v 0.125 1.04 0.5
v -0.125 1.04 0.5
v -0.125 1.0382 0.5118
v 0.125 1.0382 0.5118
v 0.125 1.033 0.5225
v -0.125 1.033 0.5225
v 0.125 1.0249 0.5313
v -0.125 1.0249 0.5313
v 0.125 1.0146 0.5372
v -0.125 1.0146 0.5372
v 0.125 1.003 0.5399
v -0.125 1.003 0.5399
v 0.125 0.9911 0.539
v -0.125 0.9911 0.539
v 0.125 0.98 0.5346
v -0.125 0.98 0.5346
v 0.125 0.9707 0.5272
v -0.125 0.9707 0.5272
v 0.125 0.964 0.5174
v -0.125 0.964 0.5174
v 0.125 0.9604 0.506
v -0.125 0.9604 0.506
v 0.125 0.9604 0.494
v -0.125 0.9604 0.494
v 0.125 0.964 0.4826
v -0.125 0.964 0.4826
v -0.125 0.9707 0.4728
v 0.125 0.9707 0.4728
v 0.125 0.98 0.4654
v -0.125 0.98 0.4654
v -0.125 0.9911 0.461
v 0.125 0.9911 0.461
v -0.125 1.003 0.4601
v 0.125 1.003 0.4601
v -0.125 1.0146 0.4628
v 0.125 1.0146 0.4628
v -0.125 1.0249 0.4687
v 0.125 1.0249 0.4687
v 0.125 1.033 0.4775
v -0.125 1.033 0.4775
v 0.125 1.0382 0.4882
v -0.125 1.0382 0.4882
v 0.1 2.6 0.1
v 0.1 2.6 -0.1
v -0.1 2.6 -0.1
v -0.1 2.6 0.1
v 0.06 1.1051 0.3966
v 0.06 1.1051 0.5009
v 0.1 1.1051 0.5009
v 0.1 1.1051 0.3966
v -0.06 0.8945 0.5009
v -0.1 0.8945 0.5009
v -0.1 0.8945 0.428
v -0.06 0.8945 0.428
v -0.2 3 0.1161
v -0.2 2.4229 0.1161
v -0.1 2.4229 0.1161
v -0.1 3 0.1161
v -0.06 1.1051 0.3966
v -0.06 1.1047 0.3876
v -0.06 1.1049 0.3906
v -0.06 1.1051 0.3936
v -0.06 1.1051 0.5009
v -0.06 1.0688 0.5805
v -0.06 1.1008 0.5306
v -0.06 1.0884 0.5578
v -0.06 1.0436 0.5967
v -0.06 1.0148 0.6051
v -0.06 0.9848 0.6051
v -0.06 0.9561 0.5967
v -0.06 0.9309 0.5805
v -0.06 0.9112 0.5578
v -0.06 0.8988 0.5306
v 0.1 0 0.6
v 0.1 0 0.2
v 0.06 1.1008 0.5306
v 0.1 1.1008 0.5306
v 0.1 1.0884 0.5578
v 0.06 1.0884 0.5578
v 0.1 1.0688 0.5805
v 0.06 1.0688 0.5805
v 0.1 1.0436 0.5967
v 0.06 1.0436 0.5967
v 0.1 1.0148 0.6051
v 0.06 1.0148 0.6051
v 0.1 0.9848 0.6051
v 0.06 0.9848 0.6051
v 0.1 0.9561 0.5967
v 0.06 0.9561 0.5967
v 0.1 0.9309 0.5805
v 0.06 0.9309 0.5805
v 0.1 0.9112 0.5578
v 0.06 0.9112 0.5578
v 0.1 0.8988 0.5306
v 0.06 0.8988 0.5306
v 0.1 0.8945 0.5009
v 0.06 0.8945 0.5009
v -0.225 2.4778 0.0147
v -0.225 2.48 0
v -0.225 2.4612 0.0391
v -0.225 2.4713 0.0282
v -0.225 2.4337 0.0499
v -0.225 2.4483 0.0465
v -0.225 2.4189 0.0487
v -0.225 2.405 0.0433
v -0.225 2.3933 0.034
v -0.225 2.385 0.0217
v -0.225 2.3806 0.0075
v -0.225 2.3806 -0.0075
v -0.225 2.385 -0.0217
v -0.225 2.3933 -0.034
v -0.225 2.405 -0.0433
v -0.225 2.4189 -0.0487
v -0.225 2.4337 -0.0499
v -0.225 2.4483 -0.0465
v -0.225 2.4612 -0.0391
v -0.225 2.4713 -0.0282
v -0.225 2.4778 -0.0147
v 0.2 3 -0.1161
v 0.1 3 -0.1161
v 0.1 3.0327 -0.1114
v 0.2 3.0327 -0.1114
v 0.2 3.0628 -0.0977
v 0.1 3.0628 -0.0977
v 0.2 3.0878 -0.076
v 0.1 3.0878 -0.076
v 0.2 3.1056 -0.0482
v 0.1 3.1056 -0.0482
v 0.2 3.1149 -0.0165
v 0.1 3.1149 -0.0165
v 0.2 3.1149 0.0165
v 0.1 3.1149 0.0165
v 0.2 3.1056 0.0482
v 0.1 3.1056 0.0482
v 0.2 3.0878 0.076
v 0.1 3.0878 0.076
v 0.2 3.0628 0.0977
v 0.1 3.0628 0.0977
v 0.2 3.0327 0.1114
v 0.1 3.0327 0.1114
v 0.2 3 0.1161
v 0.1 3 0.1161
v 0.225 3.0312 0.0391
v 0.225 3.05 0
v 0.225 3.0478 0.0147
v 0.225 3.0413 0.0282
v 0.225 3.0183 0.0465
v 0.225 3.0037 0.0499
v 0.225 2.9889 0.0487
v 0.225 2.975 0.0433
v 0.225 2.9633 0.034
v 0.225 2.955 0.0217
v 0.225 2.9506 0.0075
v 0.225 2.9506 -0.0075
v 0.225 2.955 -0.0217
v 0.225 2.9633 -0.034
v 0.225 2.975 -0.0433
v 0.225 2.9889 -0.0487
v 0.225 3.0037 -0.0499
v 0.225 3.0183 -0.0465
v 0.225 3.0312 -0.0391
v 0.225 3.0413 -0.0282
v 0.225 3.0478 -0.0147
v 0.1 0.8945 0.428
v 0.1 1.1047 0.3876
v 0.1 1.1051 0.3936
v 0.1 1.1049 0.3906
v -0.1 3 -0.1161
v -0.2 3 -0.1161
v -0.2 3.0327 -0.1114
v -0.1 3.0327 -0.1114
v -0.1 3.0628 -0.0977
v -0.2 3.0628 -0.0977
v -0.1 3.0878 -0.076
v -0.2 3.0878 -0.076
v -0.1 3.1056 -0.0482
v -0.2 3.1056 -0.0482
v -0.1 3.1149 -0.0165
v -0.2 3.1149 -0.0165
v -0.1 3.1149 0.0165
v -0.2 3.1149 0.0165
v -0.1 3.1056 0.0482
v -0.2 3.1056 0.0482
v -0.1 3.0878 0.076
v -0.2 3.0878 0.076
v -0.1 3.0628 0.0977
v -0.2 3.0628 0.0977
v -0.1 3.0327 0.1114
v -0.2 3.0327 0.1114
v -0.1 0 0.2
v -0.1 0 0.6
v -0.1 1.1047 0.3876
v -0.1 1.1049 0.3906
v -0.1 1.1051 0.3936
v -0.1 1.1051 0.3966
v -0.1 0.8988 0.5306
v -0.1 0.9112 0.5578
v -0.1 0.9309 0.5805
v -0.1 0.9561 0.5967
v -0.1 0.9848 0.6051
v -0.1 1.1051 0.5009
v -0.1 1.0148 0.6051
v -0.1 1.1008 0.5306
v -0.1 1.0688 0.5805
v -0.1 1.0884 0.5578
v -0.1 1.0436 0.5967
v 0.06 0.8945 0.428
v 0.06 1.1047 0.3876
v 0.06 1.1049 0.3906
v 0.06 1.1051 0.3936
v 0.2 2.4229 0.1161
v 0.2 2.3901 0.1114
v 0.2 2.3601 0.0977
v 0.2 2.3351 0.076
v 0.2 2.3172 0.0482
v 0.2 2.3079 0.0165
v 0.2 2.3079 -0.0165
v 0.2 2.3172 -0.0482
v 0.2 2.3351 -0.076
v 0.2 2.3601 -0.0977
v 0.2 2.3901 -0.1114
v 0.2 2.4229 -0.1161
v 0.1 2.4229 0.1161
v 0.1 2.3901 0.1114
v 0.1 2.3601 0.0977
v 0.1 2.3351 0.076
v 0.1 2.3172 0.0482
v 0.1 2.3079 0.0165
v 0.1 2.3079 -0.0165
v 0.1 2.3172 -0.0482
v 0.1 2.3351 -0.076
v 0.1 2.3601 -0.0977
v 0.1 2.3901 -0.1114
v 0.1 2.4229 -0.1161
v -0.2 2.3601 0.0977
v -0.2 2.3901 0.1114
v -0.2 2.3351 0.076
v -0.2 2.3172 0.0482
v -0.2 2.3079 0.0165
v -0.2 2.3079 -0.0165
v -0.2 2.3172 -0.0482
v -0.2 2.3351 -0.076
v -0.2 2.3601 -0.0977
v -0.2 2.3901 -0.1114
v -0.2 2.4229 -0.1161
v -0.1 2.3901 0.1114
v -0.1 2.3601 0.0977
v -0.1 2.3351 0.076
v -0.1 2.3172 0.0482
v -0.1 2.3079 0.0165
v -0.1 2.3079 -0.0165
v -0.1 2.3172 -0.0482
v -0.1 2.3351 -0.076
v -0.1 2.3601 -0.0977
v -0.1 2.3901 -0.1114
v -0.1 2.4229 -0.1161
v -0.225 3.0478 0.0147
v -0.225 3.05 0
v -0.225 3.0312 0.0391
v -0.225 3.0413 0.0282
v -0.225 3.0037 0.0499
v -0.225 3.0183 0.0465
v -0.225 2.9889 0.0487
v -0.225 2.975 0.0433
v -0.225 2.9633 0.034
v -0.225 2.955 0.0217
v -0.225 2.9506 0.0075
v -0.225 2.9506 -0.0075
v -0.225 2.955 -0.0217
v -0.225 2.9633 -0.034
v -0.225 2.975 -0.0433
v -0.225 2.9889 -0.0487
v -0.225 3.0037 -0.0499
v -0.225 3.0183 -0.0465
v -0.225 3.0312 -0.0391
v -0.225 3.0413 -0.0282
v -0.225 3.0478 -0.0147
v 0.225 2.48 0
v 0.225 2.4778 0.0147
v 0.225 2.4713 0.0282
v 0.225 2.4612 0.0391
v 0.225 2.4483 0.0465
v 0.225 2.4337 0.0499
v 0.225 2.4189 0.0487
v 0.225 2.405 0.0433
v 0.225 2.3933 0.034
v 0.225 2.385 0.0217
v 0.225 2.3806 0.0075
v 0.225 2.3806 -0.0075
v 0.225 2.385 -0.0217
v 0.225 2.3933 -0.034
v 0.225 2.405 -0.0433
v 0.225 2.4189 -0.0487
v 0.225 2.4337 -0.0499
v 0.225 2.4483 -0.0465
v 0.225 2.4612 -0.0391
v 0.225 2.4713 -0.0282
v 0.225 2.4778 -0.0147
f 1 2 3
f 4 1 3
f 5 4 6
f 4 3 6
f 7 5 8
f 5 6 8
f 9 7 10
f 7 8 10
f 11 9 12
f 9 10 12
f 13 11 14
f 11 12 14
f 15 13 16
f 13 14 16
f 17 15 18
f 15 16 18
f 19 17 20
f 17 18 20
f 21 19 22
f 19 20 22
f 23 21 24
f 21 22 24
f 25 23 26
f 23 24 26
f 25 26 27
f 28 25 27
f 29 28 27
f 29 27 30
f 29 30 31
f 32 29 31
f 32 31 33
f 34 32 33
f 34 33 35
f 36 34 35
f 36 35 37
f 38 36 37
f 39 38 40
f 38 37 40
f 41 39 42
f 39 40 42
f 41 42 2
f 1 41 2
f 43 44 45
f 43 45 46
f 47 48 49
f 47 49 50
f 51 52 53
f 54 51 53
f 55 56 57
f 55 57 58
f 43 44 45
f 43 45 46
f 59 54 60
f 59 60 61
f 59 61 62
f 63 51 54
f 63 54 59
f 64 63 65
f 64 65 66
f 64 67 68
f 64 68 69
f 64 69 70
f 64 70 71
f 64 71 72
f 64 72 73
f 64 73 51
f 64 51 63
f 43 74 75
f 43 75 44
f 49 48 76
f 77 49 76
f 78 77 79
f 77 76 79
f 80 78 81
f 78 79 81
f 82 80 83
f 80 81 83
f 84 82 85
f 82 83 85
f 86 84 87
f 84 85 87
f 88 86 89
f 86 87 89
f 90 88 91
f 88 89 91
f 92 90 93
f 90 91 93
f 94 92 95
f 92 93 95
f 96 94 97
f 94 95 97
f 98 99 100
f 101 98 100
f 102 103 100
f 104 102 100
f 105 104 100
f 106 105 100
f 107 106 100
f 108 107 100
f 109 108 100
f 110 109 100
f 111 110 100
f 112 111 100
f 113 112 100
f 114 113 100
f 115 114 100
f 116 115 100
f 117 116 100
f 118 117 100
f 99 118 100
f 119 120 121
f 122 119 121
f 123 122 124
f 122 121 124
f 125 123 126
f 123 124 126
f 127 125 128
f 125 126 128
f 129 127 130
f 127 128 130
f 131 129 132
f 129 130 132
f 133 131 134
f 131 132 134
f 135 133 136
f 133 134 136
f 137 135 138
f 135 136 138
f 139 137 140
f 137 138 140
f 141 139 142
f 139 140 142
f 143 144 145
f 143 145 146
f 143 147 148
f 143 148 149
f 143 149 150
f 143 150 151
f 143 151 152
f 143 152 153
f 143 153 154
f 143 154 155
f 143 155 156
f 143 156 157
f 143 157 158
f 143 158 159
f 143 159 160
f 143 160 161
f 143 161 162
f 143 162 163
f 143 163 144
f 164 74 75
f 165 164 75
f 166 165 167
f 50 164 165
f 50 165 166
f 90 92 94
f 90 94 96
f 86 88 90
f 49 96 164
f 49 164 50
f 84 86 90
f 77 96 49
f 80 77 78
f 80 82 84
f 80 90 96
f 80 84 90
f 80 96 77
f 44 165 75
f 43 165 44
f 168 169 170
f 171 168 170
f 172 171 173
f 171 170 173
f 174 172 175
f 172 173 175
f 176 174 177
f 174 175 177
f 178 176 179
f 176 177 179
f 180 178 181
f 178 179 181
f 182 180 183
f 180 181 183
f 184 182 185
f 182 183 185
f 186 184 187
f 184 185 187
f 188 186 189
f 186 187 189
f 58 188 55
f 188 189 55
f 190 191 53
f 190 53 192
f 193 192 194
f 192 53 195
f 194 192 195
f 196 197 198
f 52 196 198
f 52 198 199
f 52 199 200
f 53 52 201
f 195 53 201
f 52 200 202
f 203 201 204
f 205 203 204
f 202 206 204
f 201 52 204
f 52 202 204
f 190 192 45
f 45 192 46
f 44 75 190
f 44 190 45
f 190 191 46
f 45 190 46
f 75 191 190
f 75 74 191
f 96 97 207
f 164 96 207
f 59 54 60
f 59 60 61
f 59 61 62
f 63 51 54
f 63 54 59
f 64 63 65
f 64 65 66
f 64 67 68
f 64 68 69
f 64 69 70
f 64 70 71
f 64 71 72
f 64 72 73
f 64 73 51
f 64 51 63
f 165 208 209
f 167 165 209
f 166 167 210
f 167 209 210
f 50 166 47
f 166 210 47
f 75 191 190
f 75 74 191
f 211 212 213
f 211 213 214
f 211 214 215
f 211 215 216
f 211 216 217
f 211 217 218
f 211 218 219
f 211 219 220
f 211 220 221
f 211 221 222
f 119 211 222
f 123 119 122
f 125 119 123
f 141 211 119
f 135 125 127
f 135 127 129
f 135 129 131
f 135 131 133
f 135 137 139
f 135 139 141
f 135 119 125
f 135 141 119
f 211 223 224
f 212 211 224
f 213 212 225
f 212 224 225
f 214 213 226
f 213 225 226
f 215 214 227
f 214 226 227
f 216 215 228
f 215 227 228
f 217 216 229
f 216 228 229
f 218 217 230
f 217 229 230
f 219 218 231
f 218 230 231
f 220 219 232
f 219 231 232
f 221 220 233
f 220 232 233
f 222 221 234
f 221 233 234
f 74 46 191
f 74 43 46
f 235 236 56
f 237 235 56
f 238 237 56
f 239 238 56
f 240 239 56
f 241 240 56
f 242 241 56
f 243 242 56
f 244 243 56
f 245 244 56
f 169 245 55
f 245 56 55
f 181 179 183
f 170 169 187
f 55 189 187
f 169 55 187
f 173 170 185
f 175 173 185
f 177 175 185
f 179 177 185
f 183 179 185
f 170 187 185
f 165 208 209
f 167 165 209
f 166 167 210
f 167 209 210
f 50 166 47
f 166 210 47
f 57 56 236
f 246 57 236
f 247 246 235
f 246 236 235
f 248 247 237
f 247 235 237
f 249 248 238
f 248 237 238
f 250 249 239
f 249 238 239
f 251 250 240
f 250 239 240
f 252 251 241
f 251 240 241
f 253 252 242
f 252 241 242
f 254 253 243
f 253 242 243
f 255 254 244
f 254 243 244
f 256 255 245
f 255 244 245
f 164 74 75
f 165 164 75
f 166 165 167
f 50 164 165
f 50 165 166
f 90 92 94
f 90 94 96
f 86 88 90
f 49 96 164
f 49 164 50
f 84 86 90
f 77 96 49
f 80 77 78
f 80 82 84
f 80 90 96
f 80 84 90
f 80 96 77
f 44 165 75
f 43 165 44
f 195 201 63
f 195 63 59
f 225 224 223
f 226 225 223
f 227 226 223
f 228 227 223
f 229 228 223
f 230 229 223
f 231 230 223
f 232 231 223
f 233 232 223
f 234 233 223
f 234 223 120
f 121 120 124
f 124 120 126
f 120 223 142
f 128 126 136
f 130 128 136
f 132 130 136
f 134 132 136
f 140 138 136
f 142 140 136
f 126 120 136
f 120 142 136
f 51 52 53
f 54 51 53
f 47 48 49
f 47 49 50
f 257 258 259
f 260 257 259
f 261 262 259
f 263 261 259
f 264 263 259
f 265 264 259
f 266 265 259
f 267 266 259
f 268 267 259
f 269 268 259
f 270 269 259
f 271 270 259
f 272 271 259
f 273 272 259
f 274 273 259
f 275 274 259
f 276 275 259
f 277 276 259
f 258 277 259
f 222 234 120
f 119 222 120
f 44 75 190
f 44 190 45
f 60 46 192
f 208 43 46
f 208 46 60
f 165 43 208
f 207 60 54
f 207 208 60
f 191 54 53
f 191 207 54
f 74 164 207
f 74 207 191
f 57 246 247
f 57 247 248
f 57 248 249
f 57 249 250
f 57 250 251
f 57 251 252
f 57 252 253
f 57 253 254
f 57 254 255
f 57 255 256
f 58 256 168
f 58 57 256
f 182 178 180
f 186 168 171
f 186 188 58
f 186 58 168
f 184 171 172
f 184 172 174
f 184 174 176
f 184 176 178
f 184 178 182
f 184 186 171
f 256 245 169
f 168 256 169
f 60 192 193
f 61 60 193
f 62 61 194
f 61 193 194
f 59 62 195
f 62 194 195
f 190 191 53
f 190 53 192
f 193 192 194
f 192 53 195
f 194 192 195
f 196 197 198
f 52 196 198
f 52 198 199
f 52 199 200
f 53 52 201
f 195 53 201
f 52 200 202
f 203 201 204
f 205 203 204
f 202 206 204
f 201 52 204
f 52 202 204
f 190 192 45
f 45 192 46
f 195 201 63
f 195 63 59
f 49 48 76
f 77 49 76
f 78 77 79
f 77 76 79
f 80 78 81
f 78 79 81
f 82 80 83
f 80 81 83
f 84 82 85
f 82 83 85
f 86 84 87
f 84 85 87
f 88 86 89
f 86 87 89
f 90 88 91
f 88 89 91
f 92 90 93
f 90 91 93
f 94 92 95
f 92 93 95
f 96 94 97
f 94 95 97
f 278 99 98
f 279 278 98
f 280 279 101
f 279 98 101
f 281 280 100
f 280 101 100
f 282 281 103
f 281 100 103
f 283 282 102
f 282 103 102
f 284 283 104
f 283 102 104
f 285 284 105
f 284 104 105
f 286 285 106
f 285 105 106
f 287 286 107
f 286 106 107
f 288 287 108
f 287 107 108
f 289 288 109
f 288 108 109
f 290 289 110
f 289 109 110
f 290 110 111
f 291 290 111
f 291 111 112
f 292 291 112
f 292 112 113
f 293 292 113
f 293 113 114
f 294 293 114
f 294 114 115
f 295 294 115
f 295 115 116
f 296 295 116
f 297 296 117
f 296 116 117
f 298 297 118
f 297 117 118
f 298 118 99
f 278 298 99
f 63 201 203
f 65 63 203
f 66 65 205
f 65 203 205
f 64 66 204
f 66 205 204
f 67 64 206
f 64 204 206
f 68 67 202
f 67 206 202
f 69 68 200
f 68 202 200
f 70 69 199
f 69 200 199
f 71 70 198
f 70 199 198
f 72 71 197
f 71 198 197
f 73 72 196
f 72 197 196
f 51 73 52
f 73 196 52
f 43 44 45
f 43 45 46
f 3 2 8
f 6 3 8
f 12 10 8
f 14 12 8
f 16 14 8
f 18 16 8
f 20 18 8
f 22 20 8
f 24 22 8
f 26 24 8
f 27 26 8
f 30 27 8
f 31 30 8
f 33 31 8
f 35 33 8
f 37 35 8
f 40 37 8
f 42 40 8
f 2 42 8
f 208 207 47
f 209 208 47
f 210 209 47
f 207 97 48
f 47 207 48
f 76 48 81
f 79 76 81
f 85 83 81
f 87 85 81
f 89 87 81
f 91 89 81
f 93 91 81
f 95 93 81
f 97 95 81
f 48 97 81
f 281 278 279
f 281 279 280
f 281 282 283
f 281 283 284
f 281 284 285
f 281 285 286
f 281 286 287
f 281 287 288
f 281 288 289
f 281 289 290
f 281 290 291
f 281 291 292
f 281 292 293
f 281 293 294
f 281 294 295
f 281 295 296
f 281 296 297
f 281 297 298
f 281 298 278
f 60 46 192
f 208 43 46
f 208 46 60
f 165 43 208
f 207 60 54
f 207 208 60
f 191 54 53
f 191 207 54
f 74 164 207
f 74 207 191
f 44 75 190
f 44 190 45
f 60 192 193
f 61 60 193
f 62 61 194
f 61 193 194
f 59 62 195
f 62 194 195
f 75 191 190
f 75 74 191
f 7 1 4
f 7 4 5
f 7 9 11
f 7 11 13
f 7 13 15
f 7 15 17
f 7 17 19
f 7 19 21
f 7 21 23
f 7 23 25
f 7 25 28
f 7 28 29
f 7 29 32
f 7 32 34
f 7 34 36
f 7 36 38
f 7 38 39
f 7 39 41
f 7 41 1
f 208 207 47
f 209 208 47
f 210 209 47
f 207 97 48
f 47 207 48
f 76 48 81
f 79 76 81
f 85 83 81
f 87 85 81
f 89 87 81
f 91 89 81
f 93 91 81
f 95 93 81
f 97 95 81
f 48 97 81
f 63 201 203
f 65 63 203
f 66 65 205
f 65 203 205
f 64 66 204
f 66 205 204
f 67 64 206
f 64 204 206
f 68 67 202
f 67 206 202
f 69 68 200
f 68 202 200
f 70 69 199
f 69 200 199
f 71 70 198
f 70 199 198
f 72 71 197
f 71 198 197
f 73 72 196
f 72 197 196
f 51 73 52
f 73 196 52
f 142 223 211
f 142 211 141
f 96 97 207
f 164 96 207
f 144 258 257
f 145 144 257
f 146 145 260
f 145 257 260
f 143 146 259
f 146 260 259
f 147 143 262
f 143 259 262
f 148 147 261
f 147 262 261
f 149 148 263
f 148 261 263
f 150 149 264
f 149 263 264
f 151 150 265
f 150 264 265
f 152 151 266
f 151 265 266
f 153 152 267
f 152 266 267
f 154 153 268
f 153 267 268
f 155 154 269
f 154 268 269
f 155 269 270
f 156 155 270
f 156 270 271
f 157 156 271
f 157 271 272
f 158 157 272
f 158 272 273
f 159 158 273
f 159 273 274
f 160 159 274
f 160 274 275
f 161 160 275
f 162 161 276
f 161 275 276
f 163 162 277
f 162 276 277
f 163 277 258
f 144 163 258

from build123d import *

# Parameters (mm, degrees)
PAD_DEPTH         = 0.1
PAD001_DEPTH      = 0.1
CYLINDER001_R     = 0.05
CYLINDER001_DEPTH = 0.45
PAD002_DEPTH      = 0.1
CYLINDER003_R     = 0.04
CYLINDER003_DEPTH = 0.25
PAD004_DEPTH      = 0.04
PAD003_DEPTH      = 0.1
PAD005_DEPTH      = 0.04
CYLINDER_R        = 0.05
CYLINDER_DEPTH    = 0.45


with BuildPart() as pad:
    # Sketch → Pad (new body, symmetric)
    with BuildSketch(Plane.YZ):
        Polygon((0, 0.6), (0, 0.2), (2.6, -0.1), (2.6, 0.1), align=None)
    extrude(amount=PAD_DEPTH, both=True)


with BuildPart() as pad001:
    # Sketch001 → Pad001 (new body)
    with BuildSketch(Plane.YZ.offset(0.1)):
        with BuildLine():
            ThreePointArc((2.422852, 0.116102), (2.306749, 0), (2.422851, -0.116102))
            Line((2.422851, -0.116102), (3.000007, -0.116102))
            ThreePointArc((3.000007, -0.116102), (3.116109, 0), (3.000007, 0.116102))
            Line((2.422852, 0.116102), (3.000007, 0.116102))
        make_face()
    extrude(amount=PAD001_DEPTH)


with BuildPart() as cylinder001:
    # Cylinder001 → Cylinder001 (new body)
    with BuildSketch(Plane(origin=(-0.225, 3, 0), x_dir=(0, 1, 0), z_dir=(1, 0, 0))):
        Circle(CYLINDER001_R)
    extrude(amount=CYLINDER001_DEPTH)


with BuildPart() as pad002:
    # Sketch002 → Pad002 (new body)
    with BuildSketch(Plane.YZ.offset(-0.2)):
        with BuildLine():
            ThreePointArc((2.422851, 0.116102), (2.306749, 0), (2.422851, -0.116102))
            Line((2.422851, -0.116102), (3.000007, -0.116102))
            ThreePointArc((3.000007, -0.116102), (3.116109, 0), (3.000007, 0.116102))
            Line((2.422851, 0.116102), (3.000007, 0.116102))
        make_face()
    extrude(amount=PAD002_DEPTH)


with BuildPart() as cylinder003:
    # Cylinder003 → Cylinder003 (new body)
    with BuildSketch(Plane(origin=(-0.125, 1, 0.5), x_dir=(0, 1, 0), z_dir=(1, 0, 0))):
        Circle(CYLINDER003_R)
    extrude(amount=CYLINDER003_DEPTH)


with BuildPart() as pad004:
    # Sketch004 → Pad004 (new body)
    with BuildSketch(Plane.YZ.offset(0.06)):
        with BuildLine():
            ThreePointArc((1.10511, 0.50089), (0.999811, 0.606189), (0.894512, 0.50089))
            Line((0.894512, 0.50089), (0.894512, 0.396579))
            ThreePointArc((0.894512, 0.396579), (0.999811, 0.29128), (1.10511, 0.396579))
            Line((1.10511, 0.50089), (1.10511, 0.396579))
        make_face()
    extrude(amount=PAD004_DEPTH)


with BuildPart() as fusion:
    # Sketch003 → Pad003 (new body, symmetric)
    with BuildSketch(Plane.YZ):
        Polygon((0, 0.6), (0, 0.2), (2.6, -0.1), (2.6, 0.1), align=None)
    extrude(amount=PAD003_DEPTH, both=True)

    # Fusion: union Pad004
    add(pad004.part)


with BuildPart() as pad005:
    # Sketch005 → Pad005 (new body)
    with BuildSketch(Plane.YZ.offset(-0.1)):
        with BuildLine():
            ThreePointArc((1.10511, 0.50089), (0.999811, 0.606189), (0.894512, 0.50089))
            Line((0.894512, 0.50089), (0.894512, 0.396579))
            ThreePointArc((0.894512, 0.396579), (0.999811, 0.29128), (1.10511, 0.396579))
            Line((1.10511, 0.50089), (1.10511, 0.396579))
        make_face()
    extrude(amount=PAD005_DEPTH)


with BuildPart() as fusion001:
    # Fusion001 base: copy of Pad005
    add(pad005.part)

    # Fusion001: union Fusion
    add(fusion.part)


with BuildPart() as fusion002:
    # Fusion002 base: copy of Pad005
    add(pad005.part)

    # Fusion002: union Fusion
    add(fusion.part)


with BuildPart() as cylinder:
    # Cylinder → Cylinder (new body)
    with BuildSketch(Plane(origin=(-0.225, 2.43, 0), x_dir=(0, 1, 0), z_dir=(1, 0, 0))):
        Circle(CYLINDER_R)
    extrude(amount=CYLINDER_DEPTH)


solid = Compound([pad.part, pad001.part, cylinder001.part, pad002.part, cylinder003.part, fusion001.part, fusion002.part, cylinder.part])
